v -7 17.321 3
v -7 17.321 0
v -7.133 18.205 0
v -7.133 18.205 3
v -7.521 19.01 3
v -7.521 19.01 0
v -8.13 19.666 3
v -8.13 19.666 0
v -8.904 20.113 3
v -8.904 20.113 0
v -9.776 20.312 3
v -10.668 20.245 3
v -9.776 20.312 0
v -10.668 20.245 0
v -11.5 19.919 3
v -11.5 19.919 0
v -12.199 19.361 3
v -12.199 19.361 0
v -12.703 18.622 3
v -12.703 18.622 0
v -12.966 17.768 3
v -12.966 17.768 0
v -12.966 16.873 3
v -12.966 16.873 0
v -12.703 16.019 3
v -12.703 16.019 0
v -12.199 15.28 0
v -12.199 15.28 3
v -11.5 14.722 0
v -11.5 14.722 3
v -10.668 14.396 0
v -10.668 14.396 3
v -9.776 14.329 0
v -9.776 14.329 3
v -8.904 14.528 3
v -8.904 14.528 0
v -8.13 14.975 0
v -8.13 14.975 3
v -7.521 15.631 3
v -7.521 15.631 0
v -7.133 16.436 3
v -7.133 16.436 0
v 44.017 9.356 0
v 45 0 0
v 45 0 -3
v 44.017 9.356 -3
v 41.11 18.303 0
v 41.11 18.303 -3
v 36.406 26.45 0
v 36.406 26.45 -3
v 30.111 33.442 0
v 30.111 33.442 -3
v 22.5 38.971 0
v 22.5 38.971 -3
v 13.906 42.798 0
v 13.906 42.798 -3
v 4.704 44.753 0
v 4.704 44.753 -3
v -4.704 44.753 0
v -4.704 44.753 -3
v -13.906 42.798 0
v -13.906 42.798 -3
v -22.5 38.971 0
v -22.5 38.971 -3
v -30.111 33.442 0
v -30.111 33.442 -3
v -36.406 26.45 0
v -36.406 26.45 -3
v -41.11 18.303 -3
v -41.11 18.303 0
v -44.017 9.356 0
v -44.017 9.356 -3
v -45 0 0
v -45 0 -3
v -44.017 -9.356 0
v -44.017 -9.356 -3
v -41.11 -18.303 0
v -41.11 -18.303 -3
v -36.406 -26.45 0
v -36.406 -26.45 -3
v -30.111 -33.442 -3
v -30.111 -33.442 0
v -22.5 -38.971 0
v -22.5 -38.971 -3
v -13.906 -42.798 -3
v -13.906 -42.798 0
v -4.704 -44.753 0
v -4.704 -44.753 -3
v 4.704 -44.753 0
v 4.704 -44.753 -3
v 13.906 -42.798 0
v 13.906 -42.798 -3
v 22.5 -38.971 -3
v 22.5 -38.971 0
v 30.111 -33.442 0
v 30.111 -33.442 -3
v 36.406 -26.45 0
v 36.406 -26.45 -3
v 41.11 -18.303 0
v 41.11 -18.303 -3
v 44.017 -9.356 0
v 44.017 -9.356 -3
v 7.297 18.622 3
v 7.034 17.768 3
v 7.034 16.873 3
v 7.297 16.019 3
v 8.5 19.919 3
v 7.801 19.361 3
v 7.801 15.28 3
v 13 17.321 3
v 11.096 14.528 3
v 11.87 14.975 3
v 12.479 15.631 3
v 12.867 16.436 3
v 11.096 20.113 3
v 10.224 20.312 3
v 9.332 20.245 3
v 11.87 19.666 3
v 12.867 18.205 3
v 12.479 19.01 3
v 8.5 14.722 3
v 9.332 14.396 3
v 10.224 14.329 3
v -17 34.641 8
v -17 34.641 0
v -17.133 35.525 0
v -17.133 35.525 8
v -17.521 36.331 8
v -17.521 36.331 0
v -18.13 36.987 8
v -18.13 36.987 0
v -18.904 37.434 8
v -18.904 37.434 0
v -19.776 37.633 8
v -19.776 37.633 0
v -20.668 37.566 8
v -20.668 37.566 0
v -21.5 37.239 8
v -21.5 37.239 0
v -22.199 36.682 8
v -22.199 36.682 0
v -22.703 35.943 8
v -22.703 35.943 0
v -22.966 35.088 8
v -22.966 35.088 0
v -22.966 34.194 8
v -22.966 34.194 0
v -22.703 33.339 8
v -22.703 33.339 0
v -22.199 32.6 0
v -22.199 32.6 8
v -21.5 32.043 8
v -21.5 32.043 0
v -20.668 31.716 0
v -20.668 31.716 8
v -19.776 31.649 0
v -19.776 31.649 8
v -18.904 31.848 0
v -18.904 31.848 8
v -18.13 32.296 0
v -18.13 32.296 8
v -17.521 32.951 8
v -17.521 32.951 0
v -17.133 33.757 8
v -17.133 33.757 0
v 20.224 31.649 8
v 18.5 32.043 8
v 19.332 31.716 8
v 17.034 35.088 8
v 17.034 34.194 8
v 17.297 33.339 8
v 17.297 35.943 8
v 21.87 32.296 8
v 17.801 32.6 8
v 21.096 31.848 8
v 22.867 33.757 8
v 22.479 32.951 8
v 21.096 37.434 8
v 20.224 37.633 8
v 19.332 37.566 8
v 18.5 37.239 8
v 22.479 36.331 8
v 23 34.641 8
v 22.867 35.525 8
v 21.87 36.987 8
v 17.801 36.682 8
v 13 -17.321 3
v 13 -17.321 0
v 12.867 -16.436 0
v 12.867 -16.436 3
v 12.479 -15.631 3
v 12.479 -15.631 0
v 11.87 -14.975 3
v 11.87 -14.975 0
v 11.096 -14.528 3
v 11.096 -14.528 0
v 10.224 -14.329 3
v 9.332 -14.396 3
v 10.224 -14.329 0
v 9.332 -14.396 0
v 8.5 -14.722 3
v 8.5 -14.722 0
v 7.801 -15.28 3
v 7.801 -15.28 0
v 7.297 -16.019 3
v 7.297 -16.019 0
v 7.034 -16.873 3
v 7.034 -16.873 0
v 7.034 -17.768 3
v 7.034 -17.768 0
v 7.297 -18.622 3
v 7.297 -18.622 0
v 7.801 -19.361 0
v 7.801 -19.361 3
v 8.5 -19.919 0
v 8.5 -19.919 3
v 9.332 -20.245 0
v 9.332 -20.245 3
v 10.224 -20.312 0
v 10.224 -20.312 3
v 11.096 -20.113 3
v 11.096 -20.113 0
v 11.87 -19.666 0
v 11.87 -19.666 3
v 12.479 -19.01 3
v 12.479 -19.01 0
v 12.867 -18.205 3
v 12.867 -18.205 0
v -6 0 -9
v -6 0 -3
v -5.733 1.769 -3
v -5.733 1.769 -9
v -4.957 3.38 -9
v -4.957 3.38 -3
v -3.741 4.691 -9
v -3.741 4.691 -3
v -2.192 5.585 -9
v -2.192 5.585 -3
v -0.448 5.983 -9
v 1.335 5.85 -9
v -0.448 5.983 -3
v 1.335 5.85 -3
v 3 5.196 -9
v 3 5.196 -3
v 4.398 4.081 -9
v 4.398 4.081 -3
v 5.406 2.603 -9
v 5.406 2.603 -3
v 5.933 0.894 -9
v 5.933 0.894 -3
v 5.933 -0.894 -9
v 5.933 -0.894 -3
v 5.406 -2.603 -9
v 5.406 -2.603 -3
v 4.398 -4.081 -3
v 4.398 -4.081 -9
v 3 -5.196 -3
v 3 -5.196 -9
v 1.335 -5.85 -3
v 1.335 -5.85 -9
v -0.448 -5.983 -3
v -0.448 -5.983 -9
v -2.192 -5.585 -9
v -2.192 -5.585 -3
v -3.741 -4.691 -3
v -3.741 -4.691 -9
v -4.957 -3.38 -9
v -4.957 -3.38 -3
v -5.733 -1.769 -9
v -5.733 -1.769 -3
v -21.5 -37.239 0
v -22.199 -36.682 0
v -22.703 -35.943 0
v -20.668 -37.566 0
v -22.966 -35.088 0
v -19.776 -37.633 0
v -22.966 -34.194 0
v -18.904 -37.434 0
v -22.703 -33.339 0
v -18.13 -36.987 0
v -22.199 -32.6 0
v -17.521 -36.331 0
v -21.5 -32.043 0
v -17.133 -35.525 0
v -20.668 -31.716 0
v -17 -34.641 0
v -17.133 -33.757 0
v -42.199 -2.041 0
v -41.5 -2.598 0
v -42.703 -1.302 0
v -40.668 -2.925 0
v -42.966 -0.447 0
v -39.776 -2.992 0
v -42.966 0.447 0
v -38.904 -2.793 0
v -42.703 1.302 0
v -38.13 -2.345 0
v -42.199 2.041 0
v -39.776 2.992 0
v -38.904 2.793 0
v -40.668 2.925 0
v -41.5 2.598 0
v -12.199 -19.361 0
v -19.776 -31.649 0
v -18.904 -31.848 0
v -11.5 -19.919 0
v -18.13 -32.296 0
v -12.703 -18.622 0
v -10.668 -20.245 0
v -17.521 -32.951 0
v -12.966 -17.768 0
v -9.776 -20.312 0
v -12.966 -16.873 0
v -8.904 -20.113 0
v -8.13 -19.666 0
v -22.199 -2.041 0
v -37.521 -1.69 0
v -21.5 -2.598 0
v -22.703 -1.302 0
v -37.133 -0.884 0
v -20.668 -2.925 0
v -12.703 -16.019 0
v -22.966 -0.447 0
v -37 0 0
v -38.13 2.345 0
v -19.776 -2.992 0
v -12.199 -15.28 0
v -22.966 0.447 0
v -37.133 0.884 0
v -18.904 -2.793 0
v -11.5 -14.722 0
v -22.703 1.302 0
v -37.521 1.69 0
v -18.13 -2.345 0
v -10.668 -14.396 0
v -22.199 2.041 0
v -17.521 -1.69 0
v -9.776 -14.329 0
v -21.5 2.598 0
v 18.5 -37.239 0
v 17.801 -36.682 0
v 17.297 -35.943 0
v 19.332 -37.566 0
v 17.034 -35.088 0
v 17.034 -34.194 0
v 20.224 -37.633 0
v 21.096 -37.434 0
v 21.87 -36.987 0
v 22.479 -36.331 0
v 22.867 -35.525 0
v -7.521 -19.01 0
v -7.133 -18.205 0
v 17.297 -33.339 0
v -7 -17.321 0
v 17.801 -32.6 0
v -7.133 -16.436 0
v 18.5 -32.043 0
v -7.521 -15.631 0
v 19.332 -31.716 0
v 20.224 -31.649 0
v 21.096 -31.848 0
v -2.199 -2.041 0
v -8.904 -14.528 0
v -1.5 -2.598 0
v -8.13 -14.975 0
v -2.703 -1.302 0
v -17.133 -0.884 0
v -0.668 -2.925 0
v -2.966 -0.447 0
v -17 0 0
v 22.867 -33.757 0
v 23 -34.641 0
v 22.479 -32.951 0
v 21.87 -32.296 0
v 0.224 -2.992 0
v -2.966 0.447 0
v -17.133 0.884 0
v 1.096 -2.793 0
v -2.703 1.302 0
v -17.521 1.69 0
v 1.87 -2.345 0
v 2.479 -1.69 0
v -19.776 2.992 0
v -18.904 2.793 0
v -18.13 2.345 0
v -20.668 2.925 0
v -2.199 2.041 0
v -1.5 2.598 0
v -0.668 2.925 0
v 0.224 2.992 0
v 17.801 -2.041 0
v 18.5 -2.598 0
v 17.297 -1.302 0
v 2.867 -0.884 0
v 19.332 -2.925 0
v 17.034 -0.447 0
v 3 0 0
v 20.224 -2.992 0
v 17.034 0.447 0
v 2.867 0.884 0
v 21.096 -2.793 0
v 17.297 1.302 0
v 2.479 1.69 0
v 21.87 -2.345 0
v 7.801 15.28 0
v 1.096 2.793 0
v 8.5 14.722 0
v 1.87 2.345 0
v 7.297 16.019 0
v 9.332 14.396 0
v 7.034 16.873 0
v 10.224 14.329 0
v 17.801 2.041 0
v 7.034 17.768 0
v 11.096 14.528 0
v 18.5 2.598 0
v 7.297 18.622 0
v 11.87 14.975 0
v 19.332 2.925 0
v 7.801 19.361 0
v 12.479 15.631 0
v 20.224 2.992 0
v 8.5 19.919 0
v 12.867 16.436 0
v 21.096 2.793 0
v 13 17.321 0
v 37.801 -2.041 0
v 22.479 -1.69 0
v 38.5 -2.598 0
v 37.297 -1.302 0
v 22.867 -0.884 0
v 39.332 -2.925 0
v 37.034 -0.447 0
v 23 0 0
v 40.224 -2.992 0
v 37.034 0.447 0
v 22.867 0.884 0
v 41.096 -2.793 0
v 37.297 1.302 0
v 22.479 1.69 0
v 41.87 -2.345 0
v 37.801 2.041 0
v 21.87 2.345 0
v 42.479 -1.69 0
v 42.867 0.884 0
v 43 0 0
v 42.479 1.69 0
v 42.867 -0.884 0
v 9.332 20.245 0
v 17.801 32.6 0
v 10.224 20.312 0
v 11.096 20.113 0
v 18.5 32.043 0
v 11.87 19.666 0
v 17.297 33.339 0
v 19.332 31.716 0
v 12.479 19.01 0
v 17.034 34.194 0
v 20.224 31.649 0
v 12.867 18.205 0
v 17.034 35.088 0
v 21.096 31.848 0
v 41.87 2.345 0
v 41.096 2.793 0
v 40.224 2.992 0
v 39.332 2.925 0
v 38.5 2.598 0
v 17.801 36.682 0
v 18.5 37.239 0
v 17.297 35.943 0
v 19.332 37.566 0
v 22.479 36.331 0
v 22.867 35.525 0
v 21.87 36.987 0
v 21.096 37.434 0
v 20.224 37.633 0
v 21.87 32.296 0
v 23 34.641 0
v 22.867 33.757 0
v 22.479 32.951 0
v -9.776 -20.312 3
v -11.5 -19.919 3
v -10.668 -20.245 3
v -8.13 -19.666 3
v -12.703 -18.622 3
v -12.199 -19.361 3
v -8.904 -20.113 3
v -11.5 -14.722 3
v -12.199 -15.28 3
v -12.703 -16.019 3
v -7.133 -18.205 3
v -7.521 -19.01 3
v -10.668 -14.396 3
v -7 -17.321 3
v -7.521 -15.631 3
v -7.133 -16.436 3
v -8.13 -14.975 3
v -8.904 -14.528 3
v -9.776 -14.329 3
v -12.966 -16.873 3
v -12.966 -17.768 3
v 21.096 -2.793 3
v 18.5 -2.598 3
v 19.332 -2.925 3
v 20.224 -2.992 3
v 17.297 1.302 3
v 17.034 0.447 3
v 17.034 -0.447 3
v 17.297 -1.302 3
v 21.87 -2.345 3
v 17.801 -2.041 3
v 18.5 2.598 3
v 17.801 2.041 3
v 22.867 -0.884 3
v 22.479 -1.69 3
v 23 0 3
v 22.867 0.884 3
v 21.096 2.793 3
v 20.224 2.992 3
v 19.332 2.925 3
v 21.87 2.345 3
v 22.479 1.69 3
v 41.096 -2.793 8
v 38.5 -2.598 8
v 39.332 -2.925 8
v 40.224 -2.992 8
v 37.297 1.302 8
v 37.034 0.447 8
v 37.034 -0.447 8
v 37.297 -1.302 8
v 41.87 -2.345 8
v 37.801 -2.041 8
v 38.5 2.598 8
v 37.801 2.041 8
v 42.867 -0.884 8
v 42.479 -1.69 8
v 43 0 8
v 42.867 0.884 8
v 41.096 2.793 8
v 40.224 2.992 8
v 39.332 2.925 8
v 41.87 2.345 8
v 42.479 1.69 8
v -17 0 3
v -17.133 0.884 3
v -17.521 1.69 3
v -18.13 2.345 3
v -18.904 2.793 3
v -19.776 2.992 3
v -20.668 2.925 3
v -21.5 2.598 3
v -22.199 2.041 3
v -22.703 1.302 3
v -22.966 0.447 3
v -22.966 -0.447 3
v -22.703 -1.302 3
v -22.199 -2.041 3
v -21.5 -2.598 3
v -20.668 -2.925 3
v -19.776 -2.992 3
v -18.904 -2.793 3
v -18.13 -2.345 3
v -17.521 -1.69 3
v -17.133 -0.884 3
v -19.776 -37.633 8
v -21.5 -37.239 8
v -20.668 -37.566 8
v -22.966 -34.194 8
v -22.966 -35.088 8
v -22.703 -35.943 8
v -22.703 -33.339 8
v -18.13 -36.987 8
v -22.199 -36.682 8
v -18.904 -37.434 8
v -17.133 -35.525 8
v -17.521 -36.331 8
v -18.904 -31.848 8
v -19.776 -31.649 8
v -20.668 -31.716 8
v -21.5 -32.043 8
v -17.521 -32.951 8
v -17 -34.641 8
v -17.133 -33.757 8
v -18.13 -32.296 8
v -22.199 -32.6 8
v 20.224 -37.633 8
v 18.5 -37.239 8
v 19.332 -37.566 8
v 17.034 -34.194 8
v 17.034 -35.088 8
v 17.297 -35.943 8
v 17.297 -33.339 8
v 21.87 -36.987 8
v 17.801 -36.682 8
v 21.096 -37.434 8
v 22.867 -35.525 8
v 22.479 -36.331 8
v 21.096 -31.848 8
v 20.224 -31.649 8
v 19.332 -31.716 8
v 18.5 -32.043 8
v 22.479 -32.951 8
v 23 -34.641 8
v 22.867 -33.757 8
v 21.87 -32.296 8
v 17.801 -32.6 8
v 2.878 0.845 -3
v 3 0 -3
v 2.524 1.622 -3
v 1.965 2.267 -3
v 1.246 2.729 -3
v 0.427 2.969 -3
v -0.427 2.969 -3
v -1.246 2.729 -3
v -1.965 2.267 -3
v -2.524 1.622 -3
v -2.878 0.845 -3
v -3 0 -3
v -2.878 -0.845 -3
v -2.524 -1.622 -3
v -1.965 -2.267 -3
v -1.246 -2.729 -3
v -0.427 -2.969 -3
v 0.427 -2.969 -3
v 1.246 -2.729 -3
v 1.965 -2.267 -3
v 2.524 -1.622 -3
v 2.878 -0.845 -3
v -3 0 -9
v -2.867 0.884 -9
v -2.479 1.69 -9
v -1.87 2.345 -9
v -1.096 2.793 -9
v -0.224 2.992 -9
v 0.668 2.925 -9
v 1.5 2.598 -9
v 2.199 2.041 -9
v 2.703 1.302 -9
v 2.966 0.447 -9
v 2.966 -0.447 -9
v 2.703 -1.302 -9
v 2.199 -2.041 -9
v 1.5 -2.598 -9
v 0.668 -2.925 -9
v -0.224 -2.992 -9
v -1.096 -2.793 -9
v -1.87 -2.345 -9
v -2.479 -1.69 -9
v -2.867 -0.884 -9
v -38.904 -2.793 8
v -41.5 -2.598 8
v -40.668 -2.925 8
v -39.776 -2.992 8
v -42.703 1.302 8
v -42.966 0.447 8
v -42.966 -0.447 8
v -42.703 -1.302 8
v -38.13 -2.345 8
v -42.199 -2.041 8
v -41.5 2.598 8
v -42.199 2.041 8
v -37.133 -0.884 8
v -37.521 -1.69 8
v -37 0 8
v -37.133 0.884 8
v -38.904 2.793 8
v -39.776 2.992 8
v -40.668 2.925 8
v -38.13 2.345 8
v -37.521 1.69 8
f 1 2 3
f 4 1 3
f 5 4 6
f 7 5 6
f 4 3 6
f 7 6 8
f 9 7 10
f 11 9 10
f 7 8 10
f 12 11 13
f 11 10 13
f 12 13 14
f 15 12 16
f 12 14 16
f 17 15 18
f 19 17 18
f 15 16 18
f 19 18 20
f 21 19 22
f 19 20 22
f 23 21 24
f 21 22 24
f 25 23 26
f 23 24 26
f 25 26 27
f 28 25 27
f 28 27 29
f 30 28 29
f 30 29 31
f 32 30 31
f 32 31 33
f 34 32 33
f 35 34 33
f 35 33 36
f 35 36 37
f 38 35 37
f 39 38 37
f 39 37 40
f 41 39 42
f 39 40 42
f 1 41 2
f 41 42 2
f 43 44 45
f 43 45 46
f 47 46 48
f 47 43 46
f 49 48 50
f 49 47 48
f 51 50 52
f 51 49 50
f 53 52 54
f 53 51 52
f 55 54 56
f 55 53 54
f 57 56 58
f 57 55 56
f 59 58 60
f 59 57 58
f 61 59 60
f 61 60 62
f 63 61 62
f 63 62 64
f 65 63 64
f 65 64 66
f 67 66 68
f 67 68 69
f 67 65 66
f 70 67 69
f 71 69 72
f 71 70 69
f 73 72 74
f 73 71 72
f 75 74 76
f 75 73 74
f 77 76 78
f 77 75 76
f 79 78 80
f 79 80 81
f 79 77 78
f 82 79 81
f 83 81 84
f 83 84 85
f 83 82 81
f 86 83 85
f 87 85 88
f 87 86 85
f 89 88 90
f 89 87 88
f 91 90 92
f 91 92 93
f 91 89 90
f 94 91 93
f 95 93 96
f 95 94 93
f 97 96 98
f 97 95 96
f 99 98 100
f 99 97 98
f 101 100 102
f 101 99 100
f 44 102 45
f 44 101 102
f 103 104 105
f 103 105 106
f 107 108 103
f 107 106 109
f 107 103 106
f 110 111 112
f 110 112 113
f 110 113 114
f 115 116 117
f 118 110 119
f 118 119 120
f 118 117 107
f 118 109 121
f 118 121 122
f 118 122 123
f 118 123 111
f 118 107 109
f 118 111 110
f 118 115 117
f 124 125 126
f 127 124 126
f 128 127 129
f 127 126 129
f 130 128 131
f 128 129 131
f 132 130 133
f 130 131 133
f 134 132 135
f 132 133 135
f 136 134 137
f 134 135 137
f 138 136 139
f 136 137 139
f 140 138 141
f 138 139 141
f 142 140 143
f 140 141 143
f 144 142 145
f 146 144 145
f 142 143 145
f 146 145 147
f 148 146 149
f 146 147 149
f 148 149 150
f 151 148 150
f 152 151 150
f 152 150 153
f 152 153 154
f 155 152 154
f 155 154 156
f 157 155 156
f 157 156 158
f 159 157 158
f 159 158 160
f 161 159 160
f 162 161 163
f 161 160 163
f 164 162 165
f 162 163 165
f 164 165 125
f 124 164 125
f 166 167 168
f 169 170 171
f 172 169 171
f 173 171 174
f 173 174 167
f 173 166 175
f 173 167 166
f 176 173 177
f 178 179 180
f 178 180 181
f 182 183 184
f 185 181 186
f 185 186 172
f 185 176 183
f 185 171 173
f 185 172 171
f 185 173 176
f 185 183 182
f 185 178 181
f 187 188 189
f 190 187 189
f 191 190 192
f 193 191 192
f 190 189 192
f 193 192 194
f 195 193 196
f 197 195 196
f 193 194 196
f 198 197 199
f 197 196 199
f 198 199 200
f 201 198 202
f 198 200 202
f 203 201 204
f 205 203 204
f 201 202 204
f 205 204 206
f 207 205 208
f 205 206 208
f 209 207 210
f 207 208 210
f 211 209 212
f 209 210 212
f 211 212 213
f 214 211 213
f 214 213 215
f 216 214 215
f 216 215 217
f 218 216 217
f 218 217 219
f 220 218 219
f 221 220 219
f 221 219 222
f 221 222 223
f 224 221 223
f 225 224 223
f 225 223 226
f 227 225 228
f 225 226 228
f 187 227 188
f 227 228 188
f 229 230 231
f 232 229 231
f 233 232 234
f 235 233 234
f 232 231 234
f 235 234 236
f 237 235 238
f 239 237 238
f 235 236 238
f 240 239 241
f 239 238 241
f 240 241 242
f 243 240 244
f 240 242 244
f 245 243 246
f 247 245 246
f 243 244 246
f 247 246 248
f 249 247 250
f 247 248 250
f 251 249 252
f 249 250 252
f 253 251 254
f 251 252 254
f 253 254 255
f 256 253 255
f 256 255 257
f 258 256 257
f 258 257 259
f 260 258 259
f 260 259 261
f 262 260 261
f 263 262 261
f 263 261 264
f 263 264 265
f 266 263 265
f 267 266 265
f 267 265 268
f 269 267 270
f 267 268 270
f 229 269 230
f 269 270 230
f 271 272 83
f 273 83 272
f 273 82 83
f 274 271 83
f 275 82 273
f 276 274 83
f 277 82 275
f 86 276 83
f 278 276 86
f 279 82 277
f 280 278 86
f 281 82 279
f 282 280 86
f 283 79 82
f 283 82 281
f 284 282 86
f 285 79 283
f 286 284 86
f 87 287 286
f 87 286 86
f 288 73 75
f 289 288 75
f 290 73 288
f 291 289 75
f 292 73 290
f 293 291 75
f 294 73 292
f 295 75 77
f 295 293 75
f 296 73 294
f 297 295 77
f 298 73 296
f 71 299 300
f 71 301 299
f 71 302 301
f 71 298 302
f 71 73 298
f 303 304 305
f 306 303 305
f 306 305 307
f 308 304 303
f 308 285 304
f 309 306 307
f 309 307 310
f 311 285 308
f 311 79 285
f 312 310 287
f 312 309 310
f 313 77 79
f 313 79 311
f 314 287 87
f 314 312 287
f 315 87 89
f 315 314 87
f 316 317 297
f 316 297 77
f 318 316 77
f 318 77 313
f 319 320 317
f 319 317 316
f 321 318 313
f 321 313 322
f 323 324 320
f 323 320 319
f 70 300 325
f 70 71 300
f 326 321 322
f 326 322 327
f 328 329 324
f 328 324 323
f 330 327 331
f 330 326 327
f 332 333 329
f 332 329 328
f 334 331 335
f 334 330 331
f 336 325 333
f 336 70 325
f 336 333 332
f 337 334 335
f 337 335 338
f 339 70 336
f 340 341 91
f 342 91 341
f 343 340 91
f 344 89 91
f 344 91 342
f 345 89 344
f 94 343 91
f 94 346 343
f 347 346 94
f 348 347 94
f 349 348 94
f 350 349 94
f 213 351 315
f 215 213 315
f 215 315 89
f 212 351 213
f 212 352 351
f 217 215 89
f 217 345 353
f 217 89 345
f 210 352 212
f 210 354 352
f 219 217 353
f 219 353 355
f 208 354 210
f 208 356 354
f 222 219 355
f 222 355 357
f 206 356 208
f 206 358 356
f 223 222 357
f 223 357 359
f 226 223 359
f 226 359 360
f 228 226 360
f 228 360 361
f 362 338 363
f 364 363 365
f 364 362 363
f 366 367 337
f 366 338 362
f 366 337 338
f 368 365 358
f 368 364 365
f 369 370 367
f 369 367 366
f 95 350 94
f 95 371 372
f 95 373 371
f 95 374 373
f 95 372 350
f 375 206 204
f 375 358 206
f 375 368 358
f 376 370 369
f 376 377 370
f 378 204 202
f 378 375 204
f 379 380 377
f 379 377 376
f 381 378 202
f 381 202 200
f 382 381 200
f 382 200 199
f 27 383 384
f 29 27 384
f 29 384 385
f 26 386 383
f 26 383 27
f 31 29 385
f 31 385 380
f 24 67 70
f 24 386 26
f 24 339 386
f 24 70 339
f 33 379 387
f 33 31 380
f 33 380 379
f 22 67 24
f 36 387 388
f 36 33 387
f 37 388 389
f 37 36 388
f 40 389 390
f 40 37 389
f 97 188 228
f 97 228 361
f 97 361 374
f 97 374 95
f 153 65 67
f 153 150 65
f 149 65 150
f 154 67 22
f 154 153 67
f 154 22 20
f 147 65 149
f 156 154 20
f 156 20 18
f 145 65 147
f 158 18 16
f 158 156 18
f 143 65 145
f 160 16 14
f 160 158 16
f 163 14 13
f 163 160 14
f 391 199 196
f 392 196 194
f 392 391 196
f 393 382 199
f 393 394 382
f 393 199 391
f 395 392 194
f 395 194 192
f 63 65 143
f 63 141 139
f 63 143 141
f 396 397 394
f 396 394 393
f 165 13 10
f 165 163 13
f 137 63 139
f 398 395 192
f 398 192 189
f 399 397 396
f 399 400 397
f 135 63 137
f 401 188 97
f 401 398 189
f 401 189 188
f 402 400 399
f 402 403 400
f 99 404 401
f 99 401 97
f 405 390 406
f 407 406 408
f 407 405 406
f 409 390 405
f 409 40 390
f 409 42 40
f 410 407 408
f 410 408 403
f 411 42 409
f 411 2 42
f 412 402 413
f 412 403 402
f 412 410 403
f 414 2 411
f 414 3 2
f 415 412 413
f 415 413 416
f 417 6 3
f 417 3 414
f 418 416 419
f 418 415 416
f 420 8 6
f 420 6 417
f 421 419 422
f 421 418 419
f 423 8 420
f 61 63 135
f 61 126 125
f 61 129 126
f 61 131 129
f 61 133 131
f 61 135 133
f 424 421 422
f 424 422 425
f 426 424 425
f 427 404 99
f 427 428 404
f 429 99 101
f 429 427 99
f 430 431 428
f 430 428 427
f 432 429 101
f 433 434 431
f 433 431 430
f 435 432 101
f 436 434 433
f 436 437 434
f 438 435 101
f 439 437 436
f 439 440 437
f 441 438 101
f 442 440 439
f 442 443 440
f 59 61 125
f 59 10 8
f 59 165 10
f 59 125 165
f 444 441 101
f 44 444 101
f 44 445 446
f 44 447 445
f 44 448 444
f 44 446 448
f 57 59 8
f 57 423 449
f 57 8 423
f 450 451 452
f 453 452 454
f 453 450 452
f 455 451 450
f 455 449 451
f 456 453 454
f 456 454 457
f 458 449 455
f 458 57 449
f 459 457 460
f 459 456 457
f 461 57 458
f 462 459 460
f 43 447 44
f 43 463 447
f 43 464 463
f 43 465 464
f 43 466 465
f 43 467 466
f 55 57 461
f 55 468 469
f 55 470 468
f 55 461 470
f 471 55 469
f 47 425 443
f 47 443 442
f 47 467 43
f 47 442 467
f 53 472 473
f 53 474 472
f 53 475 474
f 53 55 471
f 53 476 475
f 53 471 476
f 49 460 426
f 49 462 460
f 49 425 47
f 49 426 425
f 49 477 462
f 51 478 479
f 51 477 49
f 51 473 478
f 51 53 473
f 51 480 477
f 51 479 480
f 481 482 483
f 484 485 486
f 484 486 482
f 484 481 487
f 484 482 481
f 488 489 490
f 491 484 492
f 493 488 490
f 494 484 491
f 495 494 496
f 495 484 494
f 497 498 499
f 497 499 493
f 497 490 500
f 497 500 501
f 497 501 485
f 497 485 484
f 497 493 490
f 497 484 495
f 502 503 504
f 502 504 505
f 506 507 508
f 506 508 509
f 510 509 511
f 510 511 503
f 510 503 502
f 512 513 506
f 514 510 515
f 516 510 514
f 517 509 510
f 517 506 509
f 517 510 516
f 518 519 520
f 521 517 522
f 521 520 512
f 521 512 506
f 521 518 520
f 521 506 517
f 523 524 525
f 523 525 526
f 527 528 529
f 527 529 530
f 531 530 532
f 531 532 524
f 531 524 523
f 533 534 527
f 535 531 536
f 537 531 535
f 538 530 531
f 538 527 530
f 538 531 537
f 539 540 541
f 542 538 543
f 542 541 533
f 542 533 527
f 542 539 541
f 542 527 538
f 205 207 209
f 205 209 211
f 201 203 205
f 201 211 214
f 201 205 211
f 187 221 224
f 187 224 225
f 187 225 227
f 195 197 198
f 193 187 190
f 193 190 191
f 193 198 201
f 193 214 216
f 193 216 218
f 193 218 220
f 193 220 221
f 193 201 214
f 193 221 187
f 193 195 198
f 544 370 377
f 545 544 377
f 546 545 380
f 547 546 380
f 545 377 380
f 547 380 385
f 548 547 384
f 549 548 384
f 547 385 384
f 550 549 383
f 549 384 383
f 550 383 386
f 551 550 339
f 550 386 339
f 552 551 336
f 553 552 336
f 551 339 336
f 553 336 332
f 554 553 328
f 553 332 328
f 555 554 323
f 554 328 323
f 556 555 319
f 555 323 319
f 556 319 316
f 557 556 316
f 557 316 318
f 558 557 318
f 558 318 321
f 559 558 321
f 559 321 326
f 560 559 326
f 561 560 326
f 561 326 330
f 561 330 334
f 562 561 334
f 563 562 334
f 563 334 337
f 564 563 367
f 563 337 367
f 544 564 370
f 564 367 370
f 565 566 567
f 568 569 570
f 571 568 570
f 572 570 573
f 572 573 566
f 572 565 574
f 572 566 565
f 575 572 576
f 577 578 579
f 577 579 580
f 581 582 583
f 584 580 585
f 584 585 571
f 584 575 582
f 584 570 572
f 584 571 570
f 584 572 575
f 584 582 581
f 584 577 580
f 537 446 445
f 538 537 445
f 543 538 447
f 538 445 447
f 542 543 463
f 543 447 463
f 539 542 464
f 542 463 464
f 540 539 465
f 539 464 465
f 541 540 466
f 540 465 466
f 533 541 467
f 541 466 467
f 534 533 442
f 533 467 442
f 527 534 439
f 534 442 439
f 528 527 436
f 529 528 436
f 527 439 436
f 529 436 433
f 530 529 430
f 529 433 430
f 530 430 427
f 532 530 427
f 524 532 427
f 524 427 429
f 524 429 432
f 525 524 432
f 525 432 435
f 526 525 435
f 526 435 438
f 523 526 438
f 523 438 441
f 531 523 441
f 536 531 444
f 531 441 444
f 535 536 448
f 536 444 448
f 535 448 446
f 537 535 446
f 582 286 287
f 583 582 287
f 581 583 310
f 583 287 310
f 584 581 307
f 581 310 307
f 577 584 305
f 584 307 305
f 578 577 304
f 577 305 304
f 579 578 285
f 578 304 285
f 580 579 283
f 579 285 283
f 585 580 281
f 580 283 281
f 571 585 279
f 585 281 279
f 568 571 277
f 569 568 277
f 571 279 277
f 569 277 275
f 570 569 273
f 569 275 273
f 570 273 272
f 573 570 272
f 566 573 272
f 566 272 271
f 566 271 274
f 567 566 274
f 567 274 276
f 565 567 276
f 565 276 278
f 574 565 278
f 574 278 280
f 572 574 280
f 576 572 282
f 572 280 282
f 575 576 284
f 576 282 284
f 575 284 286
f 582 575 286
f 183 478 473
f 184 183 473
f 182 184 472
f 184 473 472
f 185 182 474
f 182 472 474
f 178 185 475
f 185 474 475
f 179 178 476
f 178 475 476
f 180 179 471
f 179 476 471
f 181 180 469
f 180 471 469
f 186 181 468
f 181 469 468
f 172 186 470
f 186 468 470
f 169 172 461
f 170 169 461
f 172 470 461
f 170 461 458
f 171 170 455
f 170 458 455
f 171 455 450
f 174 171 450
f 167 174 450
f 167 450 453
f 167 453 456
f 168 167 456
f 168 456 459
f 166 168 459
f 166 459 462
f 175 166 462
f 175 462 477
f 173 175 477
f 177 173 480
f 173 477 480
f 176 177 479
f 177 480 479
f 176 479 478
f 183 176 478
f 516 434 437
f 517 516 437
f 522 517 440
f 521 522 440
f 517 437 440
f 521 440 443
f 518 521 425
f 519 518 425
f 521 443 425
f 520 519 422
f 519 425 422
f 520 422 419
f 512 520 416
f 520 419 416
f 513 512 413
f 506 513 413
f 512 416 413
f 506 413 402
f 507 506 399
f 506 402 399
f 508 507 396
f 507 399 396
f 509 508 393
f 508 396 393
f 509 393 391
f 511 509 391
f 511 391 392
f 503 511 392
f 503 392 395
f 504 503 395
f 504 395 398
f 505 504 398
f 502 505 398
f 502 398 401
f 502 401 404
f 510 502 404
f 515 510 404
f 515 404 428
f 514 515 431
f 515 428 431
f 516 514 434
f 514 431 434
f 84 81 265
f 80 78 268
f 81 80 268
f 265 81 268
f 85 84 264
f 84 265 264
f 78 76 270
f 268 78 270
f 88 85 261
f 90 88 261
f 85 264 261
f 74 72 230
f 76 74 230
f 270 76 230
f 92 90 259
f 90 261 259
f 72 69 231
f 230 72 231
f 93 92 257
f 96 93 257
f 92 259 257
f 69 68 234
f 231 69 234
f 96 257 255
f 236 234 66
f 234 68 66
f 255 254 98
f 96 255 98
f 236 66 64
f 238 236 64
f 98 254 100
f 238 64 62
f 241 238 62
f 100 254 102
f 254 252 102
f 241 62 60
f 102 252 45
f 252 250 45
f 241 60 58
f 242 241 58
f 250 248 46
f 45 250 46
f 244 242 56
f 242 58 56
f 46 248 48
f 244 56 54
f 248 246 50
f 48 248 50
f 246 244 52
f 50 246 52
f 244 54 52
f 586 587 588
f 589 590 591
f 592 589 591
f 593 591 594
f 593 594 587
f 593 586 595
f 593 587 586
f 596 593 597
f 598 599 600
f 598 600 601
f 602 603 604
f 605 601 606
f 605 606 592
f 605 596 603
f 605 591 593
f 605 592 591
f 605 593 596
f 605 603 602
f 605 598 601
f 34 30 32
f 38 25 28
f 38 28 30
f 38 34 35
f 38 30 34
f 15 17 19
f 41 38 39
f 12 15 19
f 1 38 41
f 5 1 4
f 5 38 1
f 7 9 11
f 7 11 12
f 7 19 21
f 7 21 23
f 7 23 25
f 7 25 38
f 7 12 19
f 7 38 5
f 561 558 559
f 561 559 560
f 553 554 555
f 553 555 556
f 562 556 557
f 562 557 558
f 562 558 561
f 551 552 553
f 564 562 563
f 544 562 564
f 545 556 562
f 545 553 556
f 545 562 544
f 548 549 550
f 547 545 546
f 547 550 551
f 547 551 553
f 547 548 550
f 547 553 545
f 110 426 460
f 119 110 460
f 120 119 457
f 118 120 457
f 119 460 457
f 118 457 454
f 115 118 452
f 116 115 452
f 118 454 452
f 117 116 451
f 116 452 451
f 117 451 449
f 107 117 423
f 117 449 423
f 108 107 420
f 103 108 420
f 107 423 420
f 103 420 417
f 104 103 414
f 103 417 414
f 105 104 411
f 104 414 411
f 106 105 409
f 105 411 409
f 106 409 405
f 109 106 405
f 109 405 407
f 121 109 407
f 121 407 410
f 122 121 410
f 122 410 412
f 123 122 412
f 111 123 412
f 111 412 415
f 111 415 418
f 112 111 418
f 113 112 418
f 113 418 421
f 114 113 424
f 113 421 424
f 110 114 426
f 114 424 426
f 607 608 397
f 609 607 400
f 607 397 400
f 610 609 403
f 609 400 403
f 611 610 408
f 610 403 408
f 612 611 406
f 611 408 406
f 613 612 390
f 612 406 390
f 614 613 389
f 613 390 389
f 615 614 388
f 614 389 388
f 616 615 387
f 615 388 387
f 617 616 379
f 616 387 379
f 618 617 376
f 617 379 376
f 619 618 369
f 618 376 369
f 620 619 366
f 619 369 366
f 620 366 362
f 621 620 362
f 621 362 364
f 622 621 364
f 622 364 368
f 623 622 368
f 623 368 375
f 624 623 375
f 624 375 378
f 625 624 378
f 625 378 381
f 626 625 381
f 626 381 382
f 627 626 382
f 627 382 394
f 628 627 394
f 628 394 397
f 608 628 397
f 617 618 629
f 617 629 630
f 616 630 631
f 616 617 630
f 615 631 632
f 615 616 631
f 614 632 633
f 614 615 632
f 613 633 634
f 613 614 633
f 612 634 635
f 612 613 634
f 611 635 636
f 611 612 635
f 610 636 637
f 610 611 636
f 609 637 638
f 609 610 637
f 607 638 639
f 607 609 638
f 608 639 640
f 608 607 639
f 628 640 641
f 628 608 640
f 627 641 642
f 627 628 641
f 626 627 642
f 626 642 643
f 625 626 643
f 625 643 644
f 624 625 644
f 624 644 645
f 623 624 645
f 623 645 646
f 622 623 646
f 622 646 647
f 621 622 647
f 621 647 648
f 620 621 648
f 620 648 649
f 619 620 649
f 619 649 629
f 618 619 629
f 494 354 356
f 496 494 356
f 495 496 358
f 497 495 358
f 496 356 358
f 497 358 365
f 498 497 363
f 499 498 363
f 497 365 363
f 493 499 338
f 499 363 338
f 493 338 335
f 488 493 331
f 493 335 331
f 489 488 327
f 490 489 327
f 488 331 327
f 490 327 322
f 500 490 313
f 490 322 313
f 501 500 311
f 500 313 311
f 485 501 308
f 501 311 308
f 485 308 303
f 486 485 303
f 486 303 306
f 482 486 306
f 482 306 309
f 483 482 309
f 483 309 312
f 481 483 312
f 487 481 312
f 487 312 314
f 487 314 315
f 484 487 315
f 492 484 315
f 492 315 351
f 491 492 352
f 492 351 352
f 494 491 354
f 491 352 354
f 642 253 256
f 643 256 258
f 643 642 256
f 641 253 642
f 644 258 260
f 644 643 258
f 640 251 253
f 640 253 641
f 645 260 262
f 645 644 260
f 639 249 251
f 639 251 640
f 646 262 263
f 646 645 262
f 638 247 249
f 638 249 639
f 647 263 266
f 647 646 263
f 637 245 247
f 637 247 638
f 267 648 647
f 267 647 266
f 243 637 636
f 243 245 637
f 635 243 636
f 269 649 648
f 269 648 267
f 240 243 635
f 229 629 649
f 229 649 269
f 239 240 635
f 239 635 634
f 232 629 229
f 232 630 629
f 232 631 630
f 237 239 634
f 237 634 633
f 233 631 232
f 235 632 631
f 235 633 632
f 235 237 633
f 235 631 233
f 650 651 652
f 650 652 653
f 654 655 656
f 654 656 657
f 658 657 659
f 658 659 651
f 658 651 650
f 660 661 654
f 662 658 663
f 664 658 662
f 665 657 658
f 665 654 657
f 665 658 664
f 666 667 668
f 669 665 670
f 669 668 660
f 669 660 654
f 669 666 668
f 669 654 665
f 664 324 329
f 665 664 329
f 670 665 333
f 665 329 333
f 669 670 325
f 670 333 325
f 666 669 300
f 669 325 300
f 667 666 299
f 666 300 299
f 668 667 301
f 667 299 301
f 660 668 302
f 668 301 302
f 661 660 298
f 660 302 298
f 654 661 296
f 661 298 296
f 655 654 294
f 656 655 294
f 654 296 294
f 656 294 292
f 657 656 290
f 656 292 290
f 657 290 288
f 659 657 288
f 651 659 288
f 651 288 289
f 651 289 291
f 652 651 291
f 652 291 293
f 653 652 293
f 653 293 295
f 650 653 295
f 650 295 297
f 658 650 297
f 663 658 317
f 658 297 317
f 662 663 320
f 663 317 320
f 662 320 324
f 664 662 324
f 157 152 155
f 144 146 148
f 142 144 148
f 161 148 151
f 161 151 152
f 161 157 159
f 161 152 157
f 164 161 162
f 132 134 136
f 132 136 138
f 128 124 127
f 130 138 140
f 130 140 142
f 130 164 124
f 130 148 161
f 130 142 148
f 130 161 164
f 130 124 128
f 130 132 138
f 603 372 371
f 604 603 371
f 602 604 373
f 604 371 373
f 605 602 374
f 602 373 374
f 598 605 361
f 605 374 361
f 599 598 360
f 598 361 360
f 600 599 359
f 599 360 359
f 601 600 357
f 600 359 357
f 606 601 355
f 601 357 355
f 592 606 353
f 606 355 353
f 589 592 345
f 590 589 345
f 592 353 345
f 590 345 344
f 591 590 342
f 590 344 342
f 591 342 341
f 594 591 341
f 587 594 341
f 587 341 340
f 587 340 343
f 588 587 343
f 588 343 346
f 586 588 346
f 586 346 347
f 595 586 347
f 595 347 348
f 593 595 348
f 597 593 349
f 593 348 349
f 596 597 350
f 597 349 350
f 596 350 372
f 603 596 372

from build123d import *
from build123d.topology import SkipClean

# Parameters (mm, degrees)
SKETCH_1_R          = 45
EXTRUDE_1_DEPTH     = 3
SKETCH_2_R          = 3
EXTRUDE_2_DEPTH     = 8
SKETCH_4_R          = 3
EXTRUDE_4_DEPTH     = 3
CUT_EXTRUDE_1_REACH = 66.14
SKETCH_3_R          = 3
SKETCH_5_R          = 6
SKETCH_5_R_2        = 3
EXTRUDE_1_2_DEPTH   = 6


with BuildPart() as part:
    # 草图1 → Extrude 1 (new body)
    with BuildSketch(Plane.XY):
        Circle(SKETCH_1_R)
    extrude(amount=-EXTRUDE_1_DEPTH)

    # 草图2 → 凸台-拉伸2 (add)
    with BuildSketch(Plane.XY):
        with Locations((-40, 0)):
            Circle(SKETCH_2_R)
        with Locations((-20, 34.641016151)):
            Circle(SKETCH_2_R)
        with Locations((20, 34.641016151)):
            Circle(SKETCH_2_R)
        with Locations((40, 0)):
            Circle(SKETCH_2_R)
        with Locations((20, -34.641016151)):
            Circle(SKETCH_2_R)
        with Locations((-20, -34.641016151)):
            Circle(SKETCH_2_R)
    extrude(amount=EXTRUDE_2_DEPTH)

    # 草图4 → 凸台-拉伸4 (add)
    with BuildSketch(Plane.XY):
        with Locations((-10, 17.320508076)):
            Circle(SKETCH_4_R)
        with Locations((10, 17.320508076)):
            Circle(SKETCH_4_R)
        with Locations((20, 0)):
            Circle(SKETCH_4_R)
        with Locations((10, -17.320508076)):
            Circle(SKETCH_4_R)
        with Locations((-10, -17.320508076)):
            Circle(SKETCH_4_R)
        with Locations((-20, 0)):
            Circle(SKETCH_4_R)
    extrude(amount=EXTRUDE_4_DEPTH)

    # 草图3 → 切除-拉伸1 (cut, up to next)
    with BuildSketch(Plane.XY, mode=Mode.PRIVATE) as cut_extrude_1_sk1:
        Circle(SKETCH_3_R)
    cut_extrude_1_tool1 = extrude(cut_extrude_1_sk1.sketch, amount=-CUT_EXTRUDE_1_REACH, mode=Mode.PRIVATE) & part.part
    add(cut_extrude_1_tool1.solids().sort_by_distance((0, 0, 0))[0], mode=Mode.SUBTRACT)

    # 草图5 → Extrude 1 2 (add)
    with SkipClean():  # the faces are left unmerged after this step: merging them gives an invalid solid
        with BuildSketch(Plane(origin=(0, 0, -3), x_dir=(-1, 0, 0), z_dir=(0, 0, -1))):
            Circle(SKETCH_5_R)
            Circle(SKETCH_5_R_2, mode=Mode.SUBTRACT)
        extrude(amount=EXTRUDE_1_2_DEPTH)


solid = part.part
